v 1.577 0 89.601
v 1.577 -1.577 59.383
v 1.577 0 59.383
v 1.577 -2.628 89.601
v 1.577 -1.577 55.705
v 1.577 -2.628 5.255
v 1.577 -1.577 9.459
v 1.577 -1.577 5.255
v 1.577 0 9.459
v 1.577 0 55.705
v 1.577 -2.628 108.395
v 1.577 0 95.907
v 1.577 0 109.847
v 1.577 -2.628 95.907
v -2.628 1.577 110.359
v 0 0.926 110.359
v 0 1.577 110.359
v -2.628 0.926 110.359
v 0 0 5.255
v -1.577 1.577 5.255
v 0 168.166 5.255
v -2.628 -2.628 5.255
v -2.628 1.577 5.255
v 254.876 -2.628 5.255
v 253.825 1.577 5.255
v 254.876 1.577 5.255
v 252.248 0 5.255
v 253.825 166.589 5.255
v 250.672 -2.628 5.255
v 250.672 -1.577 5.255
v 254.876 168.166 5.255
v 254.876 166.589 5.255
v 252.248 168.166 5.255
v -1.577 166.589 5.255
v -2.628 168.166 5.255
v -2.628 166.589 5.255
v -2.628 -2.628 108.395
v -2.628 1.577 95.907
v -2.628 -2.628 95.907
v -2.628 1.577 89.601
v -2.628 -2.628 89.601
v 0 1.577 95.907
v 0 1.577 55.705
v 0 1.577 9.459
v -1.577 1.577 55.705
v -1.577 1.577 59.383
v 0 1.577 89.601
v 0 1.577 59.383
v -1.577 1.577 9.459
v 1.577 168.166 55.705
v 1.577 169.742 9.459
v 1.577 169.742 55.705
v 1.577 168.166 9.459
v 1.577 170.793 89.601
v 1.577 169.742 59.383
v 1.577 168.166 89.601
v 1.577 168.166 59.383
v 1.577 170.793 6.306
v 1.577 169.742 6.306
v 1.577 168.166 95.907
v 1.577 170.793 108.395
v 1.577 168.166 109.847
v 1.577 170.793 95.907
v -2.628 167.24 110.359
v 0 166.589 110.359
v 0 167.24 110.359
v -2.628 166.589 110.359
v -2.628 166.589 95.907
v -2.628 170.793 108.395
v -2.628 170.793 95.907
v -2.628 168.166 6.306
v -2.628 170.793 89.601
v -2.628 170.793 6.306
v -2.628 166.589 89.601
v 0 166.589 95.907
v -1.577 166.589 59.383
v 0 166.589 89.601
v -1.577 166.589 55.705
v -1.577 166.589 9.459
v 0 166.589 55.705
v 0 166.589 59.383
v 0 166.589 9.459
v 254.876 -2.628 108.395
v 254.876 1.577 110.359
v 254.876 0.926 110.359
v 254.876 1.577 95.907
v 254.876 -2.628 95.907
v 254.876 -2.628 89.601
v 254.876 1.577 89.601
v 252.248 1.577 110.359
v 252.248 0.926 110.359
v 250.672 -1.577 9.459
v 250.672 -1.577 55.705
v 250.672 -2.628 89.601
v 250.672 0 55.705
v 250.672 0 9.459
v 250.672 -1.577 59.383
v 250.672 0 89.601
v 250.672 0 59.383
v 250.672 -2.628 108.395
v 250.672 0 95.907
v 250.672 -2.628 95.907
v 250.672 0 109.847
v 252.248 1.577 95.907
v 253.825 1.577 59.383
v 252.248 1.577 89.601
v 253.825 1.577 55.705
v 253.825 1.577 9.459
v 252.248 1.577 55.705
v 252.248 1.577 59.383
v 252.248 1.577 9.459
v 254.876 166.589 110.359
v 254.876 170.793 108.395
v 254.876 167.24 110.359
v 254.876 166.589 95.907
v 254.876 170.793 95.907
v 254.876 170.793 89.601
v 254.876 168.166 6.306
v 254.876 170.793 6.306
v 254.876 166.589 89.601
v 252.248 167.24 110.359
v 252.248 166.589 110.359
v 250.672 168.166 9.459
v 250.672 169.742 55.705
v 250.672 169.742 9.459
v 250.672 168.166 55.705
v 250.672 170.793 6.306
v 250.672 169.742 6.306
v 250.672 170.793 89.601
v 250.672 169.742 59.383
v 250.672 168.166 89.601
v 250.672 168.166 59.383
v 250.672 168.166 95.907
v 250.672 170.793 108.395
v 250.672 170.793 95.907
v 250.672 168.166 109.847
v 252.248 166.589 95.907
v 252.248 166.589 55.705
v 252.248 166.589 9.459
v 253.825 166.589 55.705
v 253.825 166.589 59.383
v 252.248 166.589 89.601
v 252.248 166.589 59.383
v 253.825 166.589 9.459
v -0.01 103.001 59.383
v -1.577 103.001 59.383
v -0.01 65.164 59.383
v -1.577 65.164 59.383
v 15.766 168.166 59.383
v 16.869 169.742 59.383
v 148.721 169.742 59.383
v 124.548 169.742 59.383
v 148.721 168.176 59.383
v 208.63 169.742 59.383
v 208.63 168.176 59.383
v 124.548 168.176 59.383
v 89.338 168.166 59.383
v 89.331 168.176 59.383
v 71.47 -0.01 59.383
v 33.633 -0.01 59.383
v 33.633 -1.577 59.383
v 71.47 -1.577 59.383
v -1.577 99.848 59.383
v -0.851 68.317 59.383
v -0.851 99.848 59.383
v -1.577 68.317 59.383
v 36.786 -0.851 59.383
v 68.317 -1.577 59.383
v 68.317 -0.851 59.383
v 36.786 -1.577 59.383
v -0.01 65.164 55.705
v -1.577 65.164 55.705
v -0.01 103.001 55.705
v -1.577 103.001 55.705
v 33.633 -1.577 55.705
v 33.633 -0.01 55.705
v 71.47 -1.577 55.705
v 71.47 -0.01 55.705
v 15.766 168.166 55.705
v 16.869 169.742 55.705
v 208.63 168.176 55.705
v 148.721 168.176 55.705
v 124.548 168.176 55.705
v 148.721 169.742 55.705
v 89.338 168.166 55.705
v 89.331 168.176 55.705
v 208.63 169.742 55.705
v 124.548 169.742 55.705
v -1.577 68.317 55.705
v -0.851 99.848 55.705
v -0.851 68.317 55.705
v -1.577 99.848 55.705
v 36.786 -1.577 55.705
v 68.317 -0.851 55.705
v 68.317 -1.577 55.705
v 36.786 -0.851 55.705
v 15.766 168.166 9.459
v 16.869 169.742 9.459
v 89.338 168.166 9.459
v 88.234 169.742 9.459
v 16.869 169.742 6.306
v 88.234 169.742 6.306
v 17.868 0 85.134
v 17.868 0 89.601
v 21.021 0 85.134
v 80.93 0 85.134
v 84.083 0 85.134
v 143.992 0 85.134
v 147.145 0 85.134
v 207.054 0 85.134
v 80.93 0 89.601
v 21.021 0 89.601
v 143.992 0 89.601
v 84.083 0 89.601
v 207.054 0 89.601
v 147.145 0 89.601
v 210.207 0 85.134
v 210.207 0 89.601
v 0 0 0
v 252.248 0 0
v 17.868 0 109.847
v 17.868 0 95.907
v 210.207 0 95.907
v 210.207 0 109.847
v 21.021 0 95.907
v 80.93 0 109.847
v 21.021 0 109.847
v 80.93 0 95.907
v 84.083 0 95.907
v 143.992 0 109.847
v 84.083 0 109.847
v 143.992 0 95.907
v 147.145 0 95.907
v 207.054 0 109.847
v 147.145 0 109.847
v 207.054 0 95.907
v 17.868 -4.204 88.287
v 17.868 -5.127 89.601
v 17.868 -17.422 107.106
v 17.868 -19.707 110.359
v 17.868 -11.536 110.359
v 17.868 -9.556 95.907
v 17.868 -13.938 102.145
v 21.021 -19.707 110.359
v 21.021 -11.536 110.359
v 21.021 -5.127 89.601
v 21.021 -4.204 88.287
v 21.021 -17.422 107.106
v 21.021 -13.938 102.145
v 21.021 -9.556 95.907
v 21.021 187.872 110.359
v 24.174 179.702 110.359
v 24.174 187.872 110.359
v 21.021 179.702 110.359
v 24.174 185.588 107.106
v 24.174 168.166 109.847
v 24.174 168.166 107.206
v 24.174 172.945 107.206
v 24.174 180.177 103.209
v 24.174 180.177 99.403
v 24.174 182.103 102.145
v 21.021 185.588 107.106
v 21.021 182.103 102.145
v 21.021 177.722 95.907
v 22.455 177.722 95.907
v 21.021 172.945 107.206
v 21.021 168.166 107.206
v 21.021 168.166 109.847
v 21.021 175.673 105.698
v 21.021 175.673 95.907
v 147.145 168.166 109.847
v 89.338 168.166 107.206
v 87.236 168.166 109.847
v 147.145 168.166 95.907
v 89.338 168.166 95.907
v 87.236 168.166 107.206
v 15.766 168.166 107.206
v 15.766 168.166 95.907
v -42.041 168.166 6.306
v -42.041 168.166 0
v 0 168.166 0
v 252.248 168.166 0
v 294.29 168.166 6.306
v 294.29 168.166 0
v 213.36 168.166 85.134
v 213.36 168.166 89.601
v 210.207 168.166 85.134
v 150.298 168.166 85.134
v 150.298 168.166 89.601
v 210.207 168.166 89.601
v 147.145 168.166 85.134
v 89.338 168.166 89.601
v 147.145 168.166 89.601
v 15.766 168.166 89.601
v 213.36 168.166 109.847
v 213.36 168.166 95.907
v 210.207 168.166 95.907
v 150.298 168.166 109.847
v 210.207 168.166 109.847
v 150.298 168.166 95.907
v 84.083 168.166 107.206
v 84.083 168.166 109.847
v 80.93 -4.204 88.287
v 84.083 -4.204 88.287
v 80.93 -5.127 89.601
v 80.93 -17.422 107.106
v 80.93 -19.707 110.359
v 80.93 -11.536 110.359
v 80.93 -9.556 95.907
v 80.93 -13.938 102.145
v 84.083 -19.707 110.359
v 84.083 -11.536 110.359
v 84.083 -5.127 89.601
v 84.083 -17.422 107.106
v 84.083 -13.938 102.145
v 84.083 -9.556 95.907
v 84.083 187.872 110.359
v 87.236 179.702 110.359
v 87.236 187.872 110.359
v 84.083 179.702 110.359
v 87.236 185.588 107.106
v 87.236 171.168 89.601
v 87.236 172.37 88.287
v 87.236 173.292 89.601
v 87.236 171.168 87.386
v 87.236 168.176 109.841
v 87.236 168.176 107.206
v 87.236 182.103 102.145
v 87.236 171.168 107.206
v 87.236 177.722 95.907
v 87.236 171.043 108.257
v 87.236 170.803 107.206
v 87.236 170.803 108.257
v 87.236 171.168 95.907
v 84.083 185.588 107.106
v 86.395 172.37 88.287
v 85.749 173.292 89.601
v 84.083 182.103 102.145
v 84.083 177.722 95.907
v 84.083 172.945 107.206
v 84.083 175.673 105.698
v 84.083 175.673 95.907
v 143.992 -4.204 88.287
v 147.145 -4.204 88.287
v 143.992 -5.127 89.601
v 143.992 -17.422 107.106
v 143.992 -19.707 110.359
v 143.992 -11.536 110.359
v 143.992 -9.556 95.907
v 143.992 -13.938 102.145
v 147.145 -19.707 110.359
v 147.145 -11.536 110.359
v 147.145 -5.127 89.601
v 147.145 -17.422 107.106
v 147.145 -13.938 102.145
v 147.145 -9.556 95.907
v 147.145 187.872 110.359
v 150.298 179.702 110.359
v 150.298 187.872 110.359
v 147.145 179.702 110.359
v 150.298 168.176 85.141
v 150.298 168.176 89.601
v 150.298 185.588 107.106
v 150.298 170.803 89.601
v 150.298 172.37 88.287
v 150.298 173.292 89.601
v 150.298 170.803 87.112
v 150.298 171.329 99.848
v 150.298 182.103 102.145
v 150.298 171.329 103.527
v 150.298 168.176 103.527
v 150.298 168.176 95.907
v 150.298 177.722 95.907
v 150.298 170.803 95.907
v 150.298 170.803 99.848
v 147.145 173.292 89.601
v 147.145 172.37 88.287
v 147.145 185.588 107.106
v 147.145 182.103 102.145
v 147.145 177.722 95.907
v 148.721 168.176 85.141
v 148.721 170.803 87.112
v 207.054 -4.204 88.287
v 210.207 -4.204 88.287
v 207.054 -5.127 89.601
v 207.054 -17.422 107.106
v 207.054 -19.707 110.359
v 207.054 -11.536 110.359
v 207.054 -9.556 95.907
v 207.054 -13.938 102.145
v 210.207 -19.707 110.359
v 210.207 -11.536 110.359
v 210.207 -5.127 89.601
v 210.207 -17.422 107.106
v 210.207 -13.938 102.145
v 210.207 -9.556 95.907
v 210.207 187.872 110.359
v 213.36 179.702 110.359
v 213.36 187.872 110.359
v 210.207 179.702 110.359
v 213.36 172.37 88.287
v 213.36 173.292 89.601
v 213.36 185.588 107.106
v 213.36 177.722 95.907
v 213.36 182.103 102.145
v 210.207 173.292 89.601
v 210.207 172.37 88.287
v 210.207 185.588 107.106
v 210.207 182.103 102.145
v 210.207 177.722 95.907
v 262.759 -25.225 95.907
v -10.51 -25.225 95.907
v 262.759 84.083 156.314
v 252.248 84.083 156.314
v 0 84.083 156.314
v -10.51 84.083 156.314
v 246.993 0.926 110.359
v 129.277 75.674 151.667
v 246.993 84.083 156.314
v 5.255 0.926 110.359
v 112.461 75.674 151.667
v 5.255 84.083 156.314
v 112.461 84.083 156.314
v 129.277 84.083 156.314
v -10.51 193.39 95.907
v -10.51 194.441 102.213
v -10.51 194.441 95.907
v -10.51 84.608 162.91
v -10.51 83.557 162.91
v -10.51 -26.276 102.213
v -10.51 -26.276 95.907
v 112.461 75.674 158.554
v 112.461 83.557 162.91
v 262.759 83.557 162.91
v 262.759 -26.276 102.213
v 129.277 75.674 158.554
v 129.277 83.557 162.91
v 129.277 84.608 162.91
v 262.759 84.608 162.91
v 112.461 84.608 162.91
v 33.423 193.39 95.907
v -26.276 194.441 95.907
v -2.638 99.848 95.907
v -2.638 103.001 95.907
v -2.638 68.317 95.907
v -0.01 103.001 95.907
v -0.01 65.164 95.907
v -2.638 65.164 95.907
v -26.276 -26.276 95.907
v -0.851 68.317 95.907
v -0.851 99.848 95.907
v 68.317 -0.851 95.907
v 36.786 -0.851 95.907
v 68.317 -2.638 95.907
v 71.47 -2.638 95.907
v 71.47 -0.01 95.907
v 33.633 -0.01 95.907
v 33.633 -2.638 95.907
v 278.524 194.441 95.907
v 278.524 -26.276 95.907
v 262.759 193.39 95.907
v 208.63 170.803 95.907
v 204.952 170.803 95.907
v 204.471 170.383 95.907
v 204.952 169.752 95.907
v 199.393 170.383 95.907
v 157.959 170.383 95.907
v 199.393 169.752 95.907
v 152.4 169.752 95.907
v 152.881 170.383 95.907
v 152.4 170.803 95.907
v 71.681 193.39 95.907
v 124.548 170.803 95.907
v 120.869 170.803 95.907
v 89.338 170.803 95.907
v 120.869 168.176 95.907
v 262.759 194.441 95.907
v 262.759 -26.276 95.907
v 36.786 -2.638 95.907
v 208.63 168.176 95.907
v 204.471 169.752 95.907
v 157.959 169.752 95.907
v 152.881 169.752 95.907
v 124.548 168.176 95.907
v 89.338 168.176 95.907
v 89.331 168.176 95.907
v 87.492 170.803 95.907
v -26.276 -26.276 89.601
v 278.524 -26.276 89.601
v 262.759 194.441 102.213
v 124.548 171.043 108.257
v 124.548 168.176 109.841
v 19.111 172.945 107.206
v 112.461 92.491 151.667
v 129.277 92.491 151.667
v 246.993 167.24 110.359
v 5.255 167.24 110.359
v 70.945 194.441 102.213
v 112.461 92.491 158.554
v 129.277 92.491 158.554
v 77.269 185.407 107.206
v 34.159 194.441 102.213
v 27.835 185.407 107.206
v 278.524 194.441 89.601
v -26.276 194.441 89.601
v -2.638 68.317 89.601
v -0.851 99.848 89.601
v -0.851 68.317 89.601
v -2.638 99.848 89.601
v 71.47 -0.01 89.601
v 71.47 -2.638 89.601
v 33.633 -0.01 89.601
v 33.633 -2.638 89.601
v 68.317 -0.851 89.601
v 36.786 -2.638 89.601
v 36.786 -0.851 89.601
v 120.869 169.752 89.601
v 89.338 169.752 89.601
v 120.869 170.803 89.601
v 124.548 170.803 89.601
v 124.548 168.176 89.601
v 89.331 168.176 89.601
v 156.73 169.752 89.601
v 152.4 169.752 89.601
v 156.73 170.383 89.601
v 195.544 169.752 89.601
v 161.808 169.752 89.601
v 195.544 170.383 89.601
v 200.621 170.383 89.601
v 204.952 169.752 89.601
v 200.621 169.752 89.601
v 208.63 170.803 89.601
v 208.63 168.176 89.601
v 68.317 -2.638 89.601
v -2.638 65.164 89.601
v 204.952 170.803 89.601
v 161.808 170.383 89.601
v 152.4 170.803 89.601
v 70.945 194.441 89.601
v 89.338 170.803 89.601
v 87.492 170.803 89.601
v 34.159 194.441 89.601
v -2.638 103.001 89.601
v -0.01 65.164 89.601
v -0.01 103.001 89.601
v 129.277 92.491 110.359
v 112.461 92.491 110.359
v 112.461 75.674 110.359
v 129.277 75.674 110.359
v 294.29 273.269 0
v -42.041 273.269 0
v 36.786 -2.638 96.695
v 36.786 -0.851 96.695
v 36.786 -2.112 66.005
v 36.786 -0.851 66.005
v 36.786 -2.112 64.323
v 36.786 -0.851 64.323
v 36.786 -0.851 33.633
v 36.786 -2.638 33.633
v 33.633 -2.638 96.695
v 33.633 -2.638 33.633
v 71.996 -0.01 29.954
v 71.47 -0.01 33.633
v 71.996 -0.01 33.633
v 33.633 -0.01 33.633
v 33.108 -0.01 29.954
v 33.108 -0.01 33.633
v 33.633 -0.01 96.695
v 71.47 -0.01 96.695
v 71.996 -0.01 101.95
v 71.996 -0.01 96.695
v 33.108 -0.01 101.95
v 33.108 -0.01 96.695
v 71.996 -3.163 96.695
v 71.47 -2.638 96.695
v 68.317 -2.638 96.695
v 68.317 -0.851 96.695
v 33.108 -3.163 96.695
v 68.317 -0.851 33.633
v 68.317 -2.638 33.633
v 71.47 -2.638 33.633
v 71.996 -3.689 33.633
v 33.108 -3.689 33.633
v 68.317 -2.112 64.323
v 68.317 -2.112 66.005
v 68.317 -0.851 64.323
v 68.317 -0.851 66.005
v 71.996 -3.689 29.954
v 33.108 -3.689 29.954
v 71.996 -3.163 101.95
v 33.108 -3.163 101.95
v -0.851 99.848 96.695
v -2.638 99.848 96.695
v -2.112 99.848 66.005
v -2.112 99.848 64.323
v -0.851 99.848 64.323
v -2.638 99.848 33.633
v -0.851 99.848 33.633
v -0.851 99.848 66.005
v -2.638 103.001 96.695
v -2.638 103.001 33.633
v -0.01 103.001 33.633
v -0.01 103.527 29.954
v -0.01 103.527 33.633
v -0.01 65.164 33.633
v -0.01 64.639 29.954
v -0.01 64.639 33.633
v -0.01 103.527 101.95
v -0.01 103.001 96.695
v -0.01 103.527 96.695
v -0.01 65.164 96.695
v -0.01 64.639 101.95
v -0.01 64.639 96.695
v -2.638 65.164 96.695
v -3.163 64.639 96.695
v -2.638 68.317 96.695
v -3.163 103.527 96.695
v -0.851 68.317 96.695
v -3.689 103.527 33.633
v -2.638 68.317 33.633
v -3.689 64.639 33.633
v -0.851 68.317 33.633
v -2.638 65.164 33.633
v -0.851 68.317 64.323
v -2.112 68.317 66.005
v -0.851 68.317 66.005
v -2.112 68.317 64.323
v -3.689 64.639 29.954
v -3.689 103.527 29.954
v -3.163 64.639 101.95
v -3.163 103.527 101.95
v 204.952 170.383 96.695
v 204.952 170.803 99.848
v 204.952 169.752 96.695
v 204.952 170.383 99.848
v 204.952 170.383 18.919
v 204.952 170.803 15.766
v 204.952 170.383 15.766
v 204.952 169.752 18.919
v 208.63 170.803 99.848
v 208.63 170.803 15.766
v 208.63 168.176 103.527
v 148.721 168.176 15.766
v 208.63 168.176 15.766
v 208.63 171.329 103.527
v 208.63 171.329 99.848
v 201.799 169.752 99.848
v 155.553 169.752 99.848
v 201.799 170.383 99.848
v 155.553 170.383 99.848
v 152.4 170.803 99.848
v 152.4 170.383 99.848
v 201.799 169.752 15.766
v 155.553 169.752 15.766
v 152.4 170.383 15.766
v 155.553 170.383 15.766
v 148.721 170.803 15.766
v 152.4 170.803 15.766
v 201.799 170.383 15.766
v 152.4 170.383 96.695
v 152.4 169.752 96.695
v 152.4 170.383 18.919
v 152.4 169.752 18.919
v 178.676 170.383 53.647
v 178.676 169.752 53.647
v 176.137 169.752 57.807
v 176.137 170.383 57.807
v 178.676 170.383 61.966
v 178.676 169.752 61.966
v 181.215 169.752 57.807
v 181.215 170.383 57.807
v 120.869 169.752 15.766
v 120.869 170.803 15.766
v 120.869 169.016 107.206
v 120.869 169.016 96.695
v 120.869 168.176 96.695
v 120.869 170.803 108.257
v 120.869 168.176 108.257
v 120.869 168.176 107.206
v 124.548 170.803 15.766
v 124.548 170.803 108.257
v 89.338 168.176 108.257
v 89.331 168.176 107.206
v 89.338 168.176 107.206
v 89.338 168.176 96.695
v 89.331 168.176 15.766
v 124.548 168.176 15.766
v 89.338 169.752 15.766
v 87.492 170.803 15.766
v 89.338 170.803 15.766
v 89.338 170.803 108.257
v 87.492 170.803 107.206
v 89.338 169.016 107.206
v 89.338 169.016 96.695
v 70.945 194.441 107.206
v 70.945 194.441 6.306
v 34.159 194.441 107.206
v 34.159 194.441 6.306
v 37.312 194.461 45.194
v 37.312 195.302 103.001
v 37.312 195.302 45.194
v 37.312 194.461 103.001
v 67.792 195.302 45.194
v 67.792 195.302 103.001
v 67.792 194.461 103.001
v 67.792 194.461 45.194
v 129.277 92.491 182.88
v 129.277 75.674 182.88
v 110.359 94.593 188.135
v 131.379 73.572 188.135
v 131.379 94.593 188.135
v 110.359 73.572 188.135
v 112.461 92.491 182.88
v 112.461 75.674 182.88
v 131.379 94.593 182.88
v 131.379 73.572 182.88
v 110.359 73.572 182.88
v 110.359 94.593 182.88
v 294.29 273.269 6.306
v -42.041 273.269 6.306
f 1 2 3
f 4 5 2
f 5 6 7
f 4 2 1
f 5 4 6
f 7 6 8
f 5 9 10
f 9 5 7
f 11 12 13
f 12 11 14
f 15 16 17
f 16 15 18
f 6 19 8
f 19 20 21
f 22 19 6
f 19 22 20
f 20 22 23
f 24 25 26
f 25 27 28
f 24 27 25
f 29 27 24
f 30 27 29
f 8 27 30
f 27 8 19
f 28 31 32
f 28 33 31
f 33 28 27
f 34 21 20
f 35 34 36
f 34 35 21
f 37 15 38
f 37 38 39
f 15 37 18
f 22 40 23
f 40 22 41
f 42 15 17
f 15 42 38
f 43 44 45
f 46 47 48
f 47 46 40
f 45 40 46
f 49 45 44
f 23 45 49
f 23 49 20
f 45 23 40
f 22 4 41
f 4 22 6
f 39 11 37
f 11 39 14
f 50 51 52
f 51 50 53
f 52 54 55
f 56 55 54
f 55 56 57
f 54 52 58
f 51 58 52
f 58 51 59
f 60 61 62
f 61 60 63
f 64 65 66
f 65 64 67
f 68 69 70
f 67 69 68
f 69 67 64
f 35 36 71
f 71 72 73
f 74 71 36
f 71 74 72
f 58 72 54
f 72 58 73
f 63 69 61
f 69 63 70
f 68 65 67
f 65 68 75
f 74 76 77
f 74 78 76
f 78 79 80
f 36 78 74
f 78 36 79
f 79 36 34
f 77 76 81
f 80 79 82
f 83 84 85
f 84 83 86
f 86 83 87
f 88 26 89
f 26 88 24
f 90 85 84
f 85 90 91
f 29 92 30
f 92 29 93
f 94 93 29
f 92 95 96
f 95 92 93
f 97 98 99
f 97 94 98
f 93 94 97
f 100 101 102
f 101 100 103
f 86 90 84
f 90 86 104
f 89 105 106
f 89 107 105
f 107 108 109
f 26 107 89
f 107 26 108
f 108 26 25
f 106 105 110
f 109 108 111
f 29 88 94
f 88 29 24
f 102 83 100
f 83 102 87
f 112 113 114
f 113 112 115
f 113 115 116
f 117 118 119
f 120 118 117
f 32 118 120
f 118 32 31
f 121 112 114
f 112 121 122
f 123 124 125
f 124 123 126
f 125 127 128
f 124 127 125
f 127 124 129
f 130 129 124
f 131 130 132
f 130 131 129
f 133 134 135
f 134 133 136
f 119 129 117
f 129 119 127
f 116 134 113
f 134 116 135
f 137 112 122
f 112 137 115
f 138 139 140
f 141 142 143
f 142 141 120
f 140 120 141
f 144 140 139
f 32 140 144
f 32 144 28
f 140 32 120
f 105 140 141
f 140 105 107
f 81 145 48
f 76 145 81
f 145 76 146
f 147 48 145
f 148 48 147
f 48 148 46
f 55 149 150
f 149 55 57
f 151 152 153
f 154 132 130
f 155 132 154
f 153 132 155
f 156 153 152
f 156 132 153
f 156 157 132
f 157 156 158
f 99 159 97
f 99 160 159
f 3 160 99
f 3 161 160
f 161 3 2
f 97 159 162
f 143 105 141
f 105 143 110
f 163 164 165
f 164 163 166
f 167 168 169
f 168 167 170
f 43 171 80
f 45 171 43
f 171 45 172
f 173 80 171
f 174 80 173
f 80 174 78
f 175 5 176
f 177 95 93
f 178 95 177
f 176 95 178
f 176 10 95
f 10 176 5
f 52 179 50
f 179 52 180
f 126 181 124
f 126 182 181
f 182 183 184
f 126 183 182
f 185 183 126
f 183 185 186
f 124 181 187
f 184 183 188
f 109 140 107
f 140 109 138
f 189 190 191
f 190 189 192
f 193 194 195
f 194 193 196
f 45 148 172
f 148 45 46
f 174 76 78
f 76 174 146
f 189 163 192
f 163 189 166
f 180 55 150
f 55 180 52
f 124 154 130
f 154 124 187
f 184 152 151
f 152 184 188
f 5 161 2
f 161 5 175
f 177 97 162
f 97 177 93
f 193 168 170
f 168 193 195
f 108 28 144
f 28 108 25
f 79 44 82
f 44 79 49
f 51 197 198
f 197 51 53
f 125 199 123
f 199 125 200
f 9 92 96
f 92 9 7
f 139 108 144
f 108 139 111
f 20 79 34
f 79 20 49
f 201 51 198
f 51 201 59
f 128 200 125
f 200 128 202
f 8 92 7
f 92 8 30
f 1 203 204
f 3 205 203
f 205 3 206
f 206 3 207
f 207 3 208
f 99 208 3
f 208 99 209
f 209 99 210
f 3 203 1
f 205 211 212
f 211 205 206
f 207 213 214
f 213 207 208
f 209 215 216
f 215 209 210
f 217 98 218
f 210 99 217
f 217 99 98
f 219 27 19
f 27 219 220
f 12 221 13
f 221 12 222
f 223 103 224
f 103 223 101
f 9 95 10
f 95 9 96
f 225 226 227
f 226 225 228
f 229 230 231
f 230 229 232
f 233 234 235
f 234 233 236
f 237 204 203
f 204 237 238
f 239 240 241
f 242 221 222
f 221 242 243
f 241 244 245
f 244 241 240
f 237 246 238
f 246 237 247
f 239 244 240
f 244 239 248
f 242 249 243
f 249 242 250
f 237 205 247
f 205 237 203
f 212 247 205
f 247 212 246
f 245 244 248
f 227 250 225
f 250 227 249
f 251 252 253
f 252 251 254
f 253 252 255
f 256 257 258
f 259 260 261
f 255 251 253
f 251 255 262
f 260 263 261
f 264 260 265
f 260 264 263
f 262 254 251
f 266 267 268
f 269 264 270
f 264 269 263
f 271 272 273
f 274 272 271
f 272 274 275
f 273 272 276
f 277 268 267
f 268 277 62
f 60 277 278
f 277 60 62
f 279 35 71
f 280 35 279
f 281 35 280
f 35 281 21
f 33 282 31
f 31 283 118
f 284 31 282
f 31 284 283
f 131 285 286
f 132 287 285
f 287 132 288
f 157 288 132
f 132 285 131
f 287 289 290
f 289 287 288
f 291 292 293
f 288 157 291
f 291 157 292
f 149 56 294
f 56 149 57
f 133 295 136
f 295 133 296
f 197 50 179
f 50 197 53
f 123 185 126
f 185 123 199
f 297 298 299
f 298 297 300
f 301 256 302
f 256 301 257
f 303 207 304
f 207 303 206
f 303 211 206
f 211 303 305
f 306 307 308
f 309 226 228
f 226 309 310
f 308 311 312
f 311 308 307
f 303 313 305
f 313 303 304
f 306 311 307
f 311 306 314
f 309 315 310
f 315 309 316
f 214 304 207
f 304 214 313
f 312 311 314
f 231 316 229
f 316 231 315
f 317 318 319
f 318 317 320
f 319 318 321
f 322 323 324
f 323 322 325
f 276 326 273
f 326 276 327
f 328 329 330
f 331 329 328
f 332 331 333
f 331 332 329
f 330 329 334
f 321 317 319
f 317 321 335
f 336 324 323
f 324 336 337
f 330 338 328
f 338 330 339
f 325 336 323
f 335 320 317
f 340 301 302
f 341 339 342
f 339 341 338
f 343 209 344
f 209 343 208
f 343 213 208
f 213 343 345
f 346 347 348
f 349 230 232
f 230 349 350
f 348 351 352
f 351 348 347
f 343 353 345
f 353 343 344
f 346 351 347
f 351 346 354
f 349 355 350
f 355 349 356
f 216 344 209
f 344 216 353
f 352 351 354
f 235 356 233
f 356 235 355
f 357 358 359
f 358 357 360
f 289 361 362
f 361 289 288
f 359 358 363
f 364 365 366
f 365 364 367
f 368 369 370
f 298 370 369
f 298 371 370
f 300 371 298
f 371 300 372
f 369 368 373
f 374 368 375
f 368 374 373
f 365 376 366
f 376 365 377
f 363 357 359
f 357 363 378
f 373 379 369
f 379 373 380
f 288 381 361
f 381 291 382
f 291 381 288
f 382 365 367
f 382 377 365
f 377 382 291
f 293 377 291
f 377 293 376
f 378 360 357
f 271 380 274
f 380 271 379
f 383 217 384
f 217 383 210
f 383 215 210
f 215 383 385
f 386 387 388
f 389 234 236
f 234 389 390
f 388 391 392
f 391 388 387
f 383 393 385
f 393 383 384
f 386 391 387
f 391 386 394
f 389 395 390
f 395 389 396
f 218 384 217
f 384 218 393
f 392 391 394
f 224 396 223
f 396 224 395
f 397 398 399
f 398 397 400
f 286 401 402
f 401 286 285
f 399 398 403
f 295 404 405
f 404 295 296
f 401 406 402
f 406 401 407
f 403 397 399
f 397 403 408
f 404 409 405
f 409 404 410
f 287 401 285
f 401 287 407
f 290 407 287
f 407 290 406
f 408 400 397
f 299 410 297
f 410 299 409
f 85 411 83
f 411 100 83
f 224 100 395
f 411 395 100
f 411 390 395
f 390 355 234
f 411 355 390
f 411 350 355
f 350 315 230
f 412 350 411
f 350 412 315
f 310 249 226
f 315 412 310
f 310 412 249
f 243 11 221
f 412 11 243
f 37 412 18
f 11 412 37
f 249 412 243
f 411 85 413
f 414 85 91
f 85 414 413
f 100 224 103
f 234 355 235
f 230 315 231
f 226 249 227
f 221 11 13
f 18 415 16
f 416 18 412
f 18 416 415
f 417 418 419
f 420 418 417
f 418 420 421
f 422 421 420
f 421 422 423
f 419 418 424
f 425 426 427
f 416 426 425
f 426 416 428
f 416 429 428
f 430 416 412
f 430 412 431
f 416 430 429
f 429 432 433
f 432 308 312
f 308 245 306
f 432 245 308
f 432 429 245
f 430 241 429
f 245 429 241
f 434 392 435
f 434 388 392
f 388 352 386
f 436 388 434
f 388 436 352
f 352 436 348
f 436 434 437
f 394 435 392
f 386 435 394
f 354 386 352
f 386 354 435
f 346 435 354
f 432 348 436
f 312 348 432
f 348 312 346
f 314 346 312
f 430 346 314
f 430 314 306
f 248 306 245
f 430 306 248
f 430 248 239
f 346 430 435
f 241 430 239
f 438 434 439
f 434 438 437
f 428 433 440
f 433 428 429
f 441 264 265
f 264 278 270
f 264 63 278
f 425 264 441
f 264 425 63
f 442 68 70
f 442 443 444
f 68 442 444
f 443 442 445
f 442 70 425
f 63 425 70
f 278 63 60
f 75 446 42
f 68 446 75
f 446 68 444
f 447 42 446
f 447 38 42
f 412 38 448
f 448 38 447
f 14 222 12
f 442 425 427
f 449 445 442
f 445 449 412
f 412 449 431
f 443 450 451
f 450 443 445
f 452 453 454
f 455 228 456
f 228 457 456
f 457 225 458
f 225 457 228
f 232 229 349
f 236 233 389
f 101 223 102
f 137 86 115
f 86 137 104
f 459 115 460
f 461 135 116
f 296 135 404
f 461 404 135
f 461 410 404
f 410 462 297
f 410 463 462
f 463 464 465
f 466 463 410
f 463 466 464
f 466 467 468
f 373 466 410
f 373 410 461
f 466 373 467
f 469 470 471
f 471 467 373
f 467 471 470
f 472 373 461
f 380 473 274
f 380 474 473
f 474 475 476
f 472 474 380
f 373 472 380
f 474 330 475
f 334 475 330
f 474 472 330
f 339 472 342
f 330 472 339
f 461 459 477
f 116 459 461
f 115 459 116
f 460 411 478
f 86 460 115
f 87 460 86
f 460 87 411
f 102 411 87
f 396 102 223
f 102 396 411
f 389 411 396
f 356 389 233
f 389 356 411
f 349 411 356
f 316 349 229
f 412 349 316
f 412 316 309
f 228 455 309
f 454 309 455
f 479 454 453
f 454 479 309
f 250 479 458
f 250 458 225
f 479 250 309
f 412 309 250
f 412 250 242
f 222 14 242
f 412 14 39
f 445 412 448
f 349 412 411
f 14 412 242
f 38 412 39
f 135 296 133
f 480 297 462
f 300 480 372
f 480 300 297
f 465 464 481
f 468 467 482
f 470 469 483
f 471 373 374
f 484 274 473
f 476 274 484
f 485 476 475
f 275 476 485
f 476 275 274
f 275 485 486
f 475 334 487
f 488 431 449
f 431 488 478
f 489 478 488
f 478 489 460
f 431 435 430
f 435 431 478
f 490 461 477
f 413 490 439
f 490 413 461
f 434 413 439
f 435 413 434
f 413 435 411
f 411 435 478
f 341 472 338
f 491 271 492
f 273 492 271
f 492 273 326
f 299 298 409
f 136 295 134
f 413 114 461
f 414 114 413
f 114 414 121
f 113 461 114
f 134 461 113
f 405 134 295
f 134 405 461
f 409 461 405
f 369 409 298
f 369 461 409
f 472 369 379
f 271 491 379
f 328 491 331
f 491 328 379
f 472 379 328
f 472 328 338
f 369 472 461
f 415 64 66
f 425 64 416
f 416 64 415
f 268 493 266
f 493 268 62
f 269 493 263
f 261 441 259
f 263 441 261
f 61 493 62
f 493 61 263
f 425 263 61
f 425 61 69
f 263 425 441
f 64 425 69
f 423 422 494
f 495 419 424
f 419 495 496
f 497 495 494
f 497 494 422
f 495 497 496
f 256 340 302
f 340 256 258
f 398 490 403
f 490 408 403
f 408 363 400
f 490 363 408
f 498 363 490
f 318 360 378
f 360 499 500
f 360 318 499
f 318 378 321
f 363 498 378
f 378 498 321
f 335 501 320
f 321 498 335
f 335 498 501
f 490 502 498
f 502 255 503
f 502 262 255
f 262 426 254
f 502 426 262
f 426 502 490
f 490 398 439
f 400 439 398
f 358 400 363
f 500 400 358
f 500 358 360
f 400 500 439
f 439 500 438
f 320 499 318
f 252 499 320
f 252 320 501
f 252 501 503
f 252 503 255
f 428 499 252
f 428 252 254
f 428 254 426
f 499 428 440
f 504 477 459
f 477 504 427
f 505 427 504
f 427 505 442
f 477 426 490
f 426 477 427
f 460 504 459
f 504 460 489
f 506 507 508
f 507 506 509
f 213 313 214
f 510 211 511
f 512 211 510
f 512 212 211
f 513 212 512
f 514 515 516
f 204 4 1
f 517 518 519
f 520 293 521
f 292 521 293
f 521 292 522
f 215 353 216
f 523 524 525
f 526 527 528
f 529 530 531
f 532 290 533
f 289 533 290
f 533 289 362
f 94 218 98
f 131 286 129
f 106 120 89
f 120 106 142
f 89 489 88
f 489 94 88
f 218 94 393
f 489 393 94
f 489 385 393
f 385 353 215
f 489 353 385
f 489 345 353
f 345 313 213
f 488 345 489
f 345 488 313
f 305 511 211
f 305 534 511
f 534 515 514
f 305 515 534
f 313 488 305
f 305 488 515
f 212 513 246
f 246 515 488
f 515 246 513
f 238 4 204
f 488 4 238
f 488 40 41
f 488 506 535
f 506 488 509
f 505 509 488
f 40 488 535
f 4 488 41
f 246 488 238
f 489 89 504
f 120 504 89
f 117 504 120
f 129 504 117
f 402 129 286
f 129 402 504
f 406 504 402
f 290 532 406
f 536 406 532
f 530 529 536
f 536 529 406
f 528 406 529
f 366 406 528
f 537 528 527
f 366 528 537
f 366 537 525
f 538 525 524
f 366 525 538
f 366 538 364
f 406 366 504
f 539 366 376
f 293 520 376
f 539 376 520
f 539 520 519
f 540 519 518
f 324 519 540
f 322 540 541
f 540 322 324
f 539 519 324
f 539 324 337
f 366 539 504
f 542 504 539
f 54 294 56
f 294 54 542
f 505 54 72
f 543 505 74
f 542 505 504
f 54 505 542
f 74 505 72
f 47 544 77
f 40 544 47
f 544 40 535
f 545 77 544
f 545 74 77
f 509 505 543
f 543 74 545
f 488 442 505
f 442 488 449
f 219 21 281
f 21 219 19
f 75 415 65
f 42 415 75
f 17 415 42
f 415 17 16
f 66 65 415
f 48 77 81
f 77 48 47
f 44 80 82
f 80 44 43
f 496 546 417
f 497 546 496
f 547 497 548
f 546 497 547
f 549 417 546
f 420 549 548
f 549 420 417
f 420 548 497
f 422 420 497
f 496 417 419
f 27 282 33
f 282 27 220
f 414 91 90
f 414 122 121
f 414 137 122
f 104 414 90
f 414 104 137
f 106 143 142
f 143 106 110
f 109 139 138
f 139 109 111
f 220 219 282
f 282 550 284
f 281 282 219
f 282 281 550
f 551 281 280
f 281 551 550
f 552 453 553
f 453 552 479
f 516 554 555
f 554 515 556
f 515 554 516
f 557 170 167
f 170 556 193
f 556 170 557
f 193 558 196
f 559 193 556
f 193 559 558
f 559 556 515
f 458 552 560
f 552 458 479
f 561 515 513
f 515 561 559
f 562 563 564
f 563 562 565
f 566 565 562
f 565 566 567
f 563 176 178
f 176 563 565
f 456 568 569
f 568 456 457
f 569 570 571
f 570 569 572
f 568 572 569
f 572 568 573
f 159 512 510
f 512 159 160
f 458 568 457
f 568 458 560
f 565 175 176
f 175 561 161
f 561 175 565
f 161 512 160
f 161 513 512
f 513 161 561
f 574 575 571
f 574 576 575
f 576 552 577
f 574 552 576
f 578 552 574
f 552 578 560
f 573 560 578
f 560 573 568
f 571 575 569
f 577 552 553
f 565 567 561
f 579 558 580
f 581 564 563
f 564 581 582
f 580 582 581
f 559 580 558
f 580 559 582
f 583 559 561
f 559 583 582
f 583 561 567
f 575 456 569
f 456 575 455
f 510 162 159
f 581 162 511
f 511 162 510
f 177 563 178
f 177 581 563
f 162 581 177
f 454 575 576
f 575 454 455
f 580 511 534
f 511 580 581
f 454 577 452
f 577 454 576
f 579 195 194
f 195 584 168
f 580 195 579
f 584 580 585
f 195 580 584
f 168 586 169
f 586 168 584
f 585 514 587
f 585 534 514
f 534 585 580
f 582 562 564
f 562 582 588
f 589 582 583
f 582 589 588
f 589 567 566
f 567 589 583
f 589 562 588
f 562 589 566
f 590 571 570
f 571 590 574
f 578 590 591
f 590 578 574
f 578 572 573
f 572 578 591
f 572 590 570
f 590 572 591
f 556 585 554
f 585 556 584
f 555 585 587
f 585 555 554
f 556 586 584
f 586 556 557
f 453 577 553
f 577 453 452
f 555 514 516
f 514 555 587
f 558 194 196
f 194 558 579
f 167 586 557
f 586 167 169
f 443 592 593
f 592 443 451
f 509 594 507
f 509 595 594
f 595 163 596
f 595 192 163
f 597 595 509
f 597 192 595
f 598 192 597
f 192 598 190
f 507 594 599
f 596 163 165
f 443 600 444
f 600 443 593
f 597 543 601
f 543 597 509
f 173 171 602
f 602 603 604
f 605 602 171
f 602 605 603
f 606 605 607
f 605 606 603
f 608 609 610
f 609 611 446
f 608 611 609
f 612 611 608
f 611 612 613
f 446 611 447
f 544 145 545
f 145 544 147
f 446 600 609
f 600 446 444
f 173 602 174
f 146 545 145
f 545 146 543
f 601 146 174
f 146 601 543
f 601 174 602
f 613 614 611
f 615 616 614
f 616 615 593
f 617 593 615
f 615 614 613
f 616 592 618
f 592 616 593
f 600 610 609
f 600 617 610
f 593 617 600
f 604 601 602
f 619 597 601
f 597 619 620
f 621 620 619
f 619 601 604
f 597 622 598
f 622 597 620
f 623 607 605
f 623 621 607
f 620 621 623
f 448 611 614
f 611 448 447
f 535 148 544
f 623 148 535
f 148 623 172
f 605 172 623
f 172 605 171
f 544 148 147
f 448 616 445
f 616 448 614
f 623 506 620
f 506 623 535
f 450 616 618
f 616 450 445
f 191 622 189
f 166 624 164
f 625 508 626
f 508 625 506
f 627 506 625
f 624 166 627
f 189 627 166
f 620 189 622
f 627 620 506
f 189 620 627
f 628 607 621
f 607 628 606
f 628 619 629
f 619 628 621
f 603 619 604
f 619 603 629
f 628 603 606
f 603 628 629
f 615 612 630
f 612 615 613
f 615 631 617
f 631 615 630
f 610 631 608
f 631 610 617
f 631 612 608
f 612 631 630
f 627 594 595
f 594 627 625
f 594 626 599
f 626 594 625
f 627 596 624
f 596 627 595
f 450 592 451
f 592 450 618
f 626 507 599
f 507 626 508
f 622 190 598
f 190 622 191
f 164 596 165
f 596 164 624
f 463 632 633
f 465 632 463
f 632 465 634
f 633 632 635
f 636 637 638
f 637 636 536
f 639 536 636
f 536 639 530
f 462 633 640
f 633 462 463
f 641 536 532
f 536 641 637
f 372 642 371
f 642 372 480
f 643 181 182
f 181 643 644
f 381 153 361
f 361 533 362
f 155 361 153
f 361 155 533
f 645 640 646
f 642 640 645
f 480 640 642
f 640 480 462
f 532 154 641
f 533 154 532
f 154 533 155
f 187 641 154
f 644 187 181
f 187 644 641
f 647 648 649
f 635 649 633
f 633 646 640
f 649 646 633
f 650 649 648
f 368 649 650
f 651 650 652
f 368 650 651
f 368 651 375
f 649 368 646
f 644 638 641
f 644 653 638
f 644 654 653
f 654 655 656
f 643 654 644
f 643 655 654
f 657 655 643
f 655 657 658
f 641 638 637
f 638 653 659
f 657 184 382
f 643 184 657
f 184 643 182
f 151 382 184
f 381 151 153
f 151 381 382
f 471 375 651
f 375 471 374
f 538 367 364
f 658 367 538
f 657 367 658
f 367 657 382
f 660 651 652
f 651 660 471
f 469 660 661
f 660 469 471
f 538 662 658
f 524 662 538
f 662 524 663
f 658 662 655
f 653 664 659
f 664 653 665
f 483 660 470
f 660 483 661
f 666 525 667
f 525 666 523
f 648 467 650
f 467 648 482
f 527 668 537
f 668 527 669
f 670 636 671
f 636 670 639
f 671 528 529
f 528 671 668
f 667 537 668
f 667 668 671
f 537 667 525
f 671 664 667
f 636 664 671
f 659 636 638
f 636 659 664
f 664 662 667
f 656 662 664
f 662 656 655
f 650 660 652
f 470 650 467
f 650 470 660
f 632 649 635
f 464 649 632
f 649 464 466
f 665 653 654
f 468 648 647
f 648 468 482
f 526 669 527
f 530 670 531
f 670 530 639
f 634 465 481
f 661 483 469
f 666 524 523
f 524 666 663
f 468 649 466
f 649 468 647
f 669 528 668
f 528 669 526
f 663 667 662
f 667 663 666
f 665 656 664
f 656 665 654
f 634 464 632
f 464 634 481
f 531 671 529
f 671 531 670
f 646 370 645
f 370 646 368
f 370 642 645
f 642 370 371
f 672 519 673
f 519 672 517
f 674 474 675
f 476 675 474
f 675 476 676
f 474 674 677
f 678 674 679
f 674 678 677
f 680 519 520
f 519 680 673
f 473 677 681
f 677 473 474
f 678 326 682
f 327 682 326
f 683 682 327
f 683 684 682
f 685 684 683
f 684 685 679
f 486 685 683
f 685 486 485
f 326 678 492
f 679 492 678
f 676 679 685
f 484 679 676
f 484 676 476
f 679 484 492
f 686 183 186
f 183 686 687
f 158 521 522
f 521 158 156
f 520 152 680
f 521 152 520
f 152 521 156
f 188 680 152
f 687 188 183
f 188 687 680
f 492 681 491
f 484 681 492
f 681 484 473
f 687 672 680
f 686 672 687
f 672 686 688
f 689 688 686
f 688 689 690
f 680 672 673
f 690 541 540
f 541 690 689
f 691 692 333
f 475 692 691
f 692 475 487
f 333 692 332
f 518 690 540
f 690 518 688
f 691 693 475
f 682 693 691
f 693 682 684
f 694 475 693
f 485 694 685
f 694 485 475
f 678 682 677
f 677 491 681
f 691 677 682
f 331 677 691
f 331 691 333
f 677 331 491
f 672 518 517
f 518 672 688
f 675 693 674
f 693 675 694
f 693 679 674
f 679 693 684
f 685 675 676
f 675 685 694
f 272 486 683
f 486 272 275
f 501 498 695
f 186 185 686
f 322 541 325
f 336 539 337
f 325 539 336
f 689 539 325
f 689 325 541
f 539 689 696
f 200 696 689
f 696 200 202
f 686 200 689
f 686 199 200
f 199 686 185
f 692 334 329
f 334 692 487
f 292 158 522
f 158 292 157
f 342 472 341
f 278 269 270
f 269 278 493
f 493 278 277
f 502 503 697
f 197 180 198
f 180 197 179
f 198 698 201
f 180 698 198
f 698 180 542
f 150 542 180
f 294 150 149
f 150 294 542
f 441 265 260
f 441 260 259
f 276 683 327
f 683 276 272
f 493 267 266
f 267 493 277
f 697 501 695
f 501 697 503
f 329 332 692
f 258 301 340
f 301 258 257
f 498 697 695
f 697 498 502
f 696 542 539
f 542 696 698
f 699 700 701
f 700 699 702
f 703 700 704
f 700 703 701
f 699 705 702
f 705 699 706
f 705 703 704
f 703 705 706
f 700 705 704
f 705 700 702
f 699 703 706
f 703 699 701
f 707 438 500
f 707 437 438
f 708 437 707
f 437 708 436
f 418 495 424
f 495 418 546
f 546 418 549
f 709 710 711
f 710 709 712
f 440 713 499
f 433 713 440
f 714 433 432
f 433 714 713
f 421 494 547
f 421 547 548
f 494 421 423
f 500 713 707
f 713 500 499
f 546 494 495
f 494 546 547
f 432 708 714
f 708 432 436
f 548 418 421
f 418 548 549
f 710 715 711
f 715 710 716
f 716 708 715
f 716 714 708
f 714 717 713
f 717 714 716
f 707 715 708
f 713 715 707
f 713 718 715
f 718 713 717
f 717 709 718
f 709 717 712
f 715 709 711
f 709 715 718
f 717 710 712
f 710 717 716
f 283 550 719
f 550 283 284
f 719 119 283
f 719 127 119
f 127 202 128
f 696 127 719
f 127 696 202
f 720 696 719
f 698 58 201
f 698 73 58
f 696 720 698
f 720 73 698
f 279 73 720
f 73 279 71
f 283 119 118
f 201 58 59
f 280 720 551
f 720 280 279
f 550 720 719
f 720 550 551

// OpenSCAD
// =====================================================================
//  MILWAUKEE ROAD - STANDARD 16 X 24 FT DEPOT (C.M.&ST.P., NOV 1898)
//  Album of Depot Plans (1919), sheet 01. Private reference (in copyright):
//  Research Library / RSW / Stations / Standard depots / Album of Depot Plans 1919.
//  Rib Side Works, 24 Nov 2026. FIRST SHAPE MODEL for review - not cut into print sections.
//  KNOWN (from the sheet): 16 x 24 ft; waiting room 11 x 8, office with bay, freight room 11 ft 4 x 16; shingle roof with cresting, drop siding; as built at Medary(ville?) and Riggs; also used at Arbor Vitae, Oconto Jct and Knowlton Wis., Templeton, Marvin, Bell Center and others.
//  ESTIMATE: wall and ridge heights (sheets are small copies), window spacing, colours.
//  Shared depot builder ../../../_common/rsw_depot.scad (x along the track, y = 0 town side,
//  track side +y, feet).  SCALE: 29 = G, 48 = O, 87 = HO.
// =====================================================================
SCALE = 29;
include <../../../_common/rsw_depot.scad>

depot(blocks = [[0, 24, 0, 16, 10.5, 0.55, 1, 2.5, 0]],
      pavs   = [],
      wins   = [[5, 1, 3, 6, 3.2], [5, 0, 3, 6, 3.2], [8, 2, 3, 6, 3.2]],
      doors  = [[17, 1, 5, 8, 2], [10, 1, 3, 7.5, 0]],
      bays   = [[5, 1, 7, 2.5]],
      chims  = [[11.5, 8, 17.9]],
      plat   = [-4, 32, 10, 0.6]);
